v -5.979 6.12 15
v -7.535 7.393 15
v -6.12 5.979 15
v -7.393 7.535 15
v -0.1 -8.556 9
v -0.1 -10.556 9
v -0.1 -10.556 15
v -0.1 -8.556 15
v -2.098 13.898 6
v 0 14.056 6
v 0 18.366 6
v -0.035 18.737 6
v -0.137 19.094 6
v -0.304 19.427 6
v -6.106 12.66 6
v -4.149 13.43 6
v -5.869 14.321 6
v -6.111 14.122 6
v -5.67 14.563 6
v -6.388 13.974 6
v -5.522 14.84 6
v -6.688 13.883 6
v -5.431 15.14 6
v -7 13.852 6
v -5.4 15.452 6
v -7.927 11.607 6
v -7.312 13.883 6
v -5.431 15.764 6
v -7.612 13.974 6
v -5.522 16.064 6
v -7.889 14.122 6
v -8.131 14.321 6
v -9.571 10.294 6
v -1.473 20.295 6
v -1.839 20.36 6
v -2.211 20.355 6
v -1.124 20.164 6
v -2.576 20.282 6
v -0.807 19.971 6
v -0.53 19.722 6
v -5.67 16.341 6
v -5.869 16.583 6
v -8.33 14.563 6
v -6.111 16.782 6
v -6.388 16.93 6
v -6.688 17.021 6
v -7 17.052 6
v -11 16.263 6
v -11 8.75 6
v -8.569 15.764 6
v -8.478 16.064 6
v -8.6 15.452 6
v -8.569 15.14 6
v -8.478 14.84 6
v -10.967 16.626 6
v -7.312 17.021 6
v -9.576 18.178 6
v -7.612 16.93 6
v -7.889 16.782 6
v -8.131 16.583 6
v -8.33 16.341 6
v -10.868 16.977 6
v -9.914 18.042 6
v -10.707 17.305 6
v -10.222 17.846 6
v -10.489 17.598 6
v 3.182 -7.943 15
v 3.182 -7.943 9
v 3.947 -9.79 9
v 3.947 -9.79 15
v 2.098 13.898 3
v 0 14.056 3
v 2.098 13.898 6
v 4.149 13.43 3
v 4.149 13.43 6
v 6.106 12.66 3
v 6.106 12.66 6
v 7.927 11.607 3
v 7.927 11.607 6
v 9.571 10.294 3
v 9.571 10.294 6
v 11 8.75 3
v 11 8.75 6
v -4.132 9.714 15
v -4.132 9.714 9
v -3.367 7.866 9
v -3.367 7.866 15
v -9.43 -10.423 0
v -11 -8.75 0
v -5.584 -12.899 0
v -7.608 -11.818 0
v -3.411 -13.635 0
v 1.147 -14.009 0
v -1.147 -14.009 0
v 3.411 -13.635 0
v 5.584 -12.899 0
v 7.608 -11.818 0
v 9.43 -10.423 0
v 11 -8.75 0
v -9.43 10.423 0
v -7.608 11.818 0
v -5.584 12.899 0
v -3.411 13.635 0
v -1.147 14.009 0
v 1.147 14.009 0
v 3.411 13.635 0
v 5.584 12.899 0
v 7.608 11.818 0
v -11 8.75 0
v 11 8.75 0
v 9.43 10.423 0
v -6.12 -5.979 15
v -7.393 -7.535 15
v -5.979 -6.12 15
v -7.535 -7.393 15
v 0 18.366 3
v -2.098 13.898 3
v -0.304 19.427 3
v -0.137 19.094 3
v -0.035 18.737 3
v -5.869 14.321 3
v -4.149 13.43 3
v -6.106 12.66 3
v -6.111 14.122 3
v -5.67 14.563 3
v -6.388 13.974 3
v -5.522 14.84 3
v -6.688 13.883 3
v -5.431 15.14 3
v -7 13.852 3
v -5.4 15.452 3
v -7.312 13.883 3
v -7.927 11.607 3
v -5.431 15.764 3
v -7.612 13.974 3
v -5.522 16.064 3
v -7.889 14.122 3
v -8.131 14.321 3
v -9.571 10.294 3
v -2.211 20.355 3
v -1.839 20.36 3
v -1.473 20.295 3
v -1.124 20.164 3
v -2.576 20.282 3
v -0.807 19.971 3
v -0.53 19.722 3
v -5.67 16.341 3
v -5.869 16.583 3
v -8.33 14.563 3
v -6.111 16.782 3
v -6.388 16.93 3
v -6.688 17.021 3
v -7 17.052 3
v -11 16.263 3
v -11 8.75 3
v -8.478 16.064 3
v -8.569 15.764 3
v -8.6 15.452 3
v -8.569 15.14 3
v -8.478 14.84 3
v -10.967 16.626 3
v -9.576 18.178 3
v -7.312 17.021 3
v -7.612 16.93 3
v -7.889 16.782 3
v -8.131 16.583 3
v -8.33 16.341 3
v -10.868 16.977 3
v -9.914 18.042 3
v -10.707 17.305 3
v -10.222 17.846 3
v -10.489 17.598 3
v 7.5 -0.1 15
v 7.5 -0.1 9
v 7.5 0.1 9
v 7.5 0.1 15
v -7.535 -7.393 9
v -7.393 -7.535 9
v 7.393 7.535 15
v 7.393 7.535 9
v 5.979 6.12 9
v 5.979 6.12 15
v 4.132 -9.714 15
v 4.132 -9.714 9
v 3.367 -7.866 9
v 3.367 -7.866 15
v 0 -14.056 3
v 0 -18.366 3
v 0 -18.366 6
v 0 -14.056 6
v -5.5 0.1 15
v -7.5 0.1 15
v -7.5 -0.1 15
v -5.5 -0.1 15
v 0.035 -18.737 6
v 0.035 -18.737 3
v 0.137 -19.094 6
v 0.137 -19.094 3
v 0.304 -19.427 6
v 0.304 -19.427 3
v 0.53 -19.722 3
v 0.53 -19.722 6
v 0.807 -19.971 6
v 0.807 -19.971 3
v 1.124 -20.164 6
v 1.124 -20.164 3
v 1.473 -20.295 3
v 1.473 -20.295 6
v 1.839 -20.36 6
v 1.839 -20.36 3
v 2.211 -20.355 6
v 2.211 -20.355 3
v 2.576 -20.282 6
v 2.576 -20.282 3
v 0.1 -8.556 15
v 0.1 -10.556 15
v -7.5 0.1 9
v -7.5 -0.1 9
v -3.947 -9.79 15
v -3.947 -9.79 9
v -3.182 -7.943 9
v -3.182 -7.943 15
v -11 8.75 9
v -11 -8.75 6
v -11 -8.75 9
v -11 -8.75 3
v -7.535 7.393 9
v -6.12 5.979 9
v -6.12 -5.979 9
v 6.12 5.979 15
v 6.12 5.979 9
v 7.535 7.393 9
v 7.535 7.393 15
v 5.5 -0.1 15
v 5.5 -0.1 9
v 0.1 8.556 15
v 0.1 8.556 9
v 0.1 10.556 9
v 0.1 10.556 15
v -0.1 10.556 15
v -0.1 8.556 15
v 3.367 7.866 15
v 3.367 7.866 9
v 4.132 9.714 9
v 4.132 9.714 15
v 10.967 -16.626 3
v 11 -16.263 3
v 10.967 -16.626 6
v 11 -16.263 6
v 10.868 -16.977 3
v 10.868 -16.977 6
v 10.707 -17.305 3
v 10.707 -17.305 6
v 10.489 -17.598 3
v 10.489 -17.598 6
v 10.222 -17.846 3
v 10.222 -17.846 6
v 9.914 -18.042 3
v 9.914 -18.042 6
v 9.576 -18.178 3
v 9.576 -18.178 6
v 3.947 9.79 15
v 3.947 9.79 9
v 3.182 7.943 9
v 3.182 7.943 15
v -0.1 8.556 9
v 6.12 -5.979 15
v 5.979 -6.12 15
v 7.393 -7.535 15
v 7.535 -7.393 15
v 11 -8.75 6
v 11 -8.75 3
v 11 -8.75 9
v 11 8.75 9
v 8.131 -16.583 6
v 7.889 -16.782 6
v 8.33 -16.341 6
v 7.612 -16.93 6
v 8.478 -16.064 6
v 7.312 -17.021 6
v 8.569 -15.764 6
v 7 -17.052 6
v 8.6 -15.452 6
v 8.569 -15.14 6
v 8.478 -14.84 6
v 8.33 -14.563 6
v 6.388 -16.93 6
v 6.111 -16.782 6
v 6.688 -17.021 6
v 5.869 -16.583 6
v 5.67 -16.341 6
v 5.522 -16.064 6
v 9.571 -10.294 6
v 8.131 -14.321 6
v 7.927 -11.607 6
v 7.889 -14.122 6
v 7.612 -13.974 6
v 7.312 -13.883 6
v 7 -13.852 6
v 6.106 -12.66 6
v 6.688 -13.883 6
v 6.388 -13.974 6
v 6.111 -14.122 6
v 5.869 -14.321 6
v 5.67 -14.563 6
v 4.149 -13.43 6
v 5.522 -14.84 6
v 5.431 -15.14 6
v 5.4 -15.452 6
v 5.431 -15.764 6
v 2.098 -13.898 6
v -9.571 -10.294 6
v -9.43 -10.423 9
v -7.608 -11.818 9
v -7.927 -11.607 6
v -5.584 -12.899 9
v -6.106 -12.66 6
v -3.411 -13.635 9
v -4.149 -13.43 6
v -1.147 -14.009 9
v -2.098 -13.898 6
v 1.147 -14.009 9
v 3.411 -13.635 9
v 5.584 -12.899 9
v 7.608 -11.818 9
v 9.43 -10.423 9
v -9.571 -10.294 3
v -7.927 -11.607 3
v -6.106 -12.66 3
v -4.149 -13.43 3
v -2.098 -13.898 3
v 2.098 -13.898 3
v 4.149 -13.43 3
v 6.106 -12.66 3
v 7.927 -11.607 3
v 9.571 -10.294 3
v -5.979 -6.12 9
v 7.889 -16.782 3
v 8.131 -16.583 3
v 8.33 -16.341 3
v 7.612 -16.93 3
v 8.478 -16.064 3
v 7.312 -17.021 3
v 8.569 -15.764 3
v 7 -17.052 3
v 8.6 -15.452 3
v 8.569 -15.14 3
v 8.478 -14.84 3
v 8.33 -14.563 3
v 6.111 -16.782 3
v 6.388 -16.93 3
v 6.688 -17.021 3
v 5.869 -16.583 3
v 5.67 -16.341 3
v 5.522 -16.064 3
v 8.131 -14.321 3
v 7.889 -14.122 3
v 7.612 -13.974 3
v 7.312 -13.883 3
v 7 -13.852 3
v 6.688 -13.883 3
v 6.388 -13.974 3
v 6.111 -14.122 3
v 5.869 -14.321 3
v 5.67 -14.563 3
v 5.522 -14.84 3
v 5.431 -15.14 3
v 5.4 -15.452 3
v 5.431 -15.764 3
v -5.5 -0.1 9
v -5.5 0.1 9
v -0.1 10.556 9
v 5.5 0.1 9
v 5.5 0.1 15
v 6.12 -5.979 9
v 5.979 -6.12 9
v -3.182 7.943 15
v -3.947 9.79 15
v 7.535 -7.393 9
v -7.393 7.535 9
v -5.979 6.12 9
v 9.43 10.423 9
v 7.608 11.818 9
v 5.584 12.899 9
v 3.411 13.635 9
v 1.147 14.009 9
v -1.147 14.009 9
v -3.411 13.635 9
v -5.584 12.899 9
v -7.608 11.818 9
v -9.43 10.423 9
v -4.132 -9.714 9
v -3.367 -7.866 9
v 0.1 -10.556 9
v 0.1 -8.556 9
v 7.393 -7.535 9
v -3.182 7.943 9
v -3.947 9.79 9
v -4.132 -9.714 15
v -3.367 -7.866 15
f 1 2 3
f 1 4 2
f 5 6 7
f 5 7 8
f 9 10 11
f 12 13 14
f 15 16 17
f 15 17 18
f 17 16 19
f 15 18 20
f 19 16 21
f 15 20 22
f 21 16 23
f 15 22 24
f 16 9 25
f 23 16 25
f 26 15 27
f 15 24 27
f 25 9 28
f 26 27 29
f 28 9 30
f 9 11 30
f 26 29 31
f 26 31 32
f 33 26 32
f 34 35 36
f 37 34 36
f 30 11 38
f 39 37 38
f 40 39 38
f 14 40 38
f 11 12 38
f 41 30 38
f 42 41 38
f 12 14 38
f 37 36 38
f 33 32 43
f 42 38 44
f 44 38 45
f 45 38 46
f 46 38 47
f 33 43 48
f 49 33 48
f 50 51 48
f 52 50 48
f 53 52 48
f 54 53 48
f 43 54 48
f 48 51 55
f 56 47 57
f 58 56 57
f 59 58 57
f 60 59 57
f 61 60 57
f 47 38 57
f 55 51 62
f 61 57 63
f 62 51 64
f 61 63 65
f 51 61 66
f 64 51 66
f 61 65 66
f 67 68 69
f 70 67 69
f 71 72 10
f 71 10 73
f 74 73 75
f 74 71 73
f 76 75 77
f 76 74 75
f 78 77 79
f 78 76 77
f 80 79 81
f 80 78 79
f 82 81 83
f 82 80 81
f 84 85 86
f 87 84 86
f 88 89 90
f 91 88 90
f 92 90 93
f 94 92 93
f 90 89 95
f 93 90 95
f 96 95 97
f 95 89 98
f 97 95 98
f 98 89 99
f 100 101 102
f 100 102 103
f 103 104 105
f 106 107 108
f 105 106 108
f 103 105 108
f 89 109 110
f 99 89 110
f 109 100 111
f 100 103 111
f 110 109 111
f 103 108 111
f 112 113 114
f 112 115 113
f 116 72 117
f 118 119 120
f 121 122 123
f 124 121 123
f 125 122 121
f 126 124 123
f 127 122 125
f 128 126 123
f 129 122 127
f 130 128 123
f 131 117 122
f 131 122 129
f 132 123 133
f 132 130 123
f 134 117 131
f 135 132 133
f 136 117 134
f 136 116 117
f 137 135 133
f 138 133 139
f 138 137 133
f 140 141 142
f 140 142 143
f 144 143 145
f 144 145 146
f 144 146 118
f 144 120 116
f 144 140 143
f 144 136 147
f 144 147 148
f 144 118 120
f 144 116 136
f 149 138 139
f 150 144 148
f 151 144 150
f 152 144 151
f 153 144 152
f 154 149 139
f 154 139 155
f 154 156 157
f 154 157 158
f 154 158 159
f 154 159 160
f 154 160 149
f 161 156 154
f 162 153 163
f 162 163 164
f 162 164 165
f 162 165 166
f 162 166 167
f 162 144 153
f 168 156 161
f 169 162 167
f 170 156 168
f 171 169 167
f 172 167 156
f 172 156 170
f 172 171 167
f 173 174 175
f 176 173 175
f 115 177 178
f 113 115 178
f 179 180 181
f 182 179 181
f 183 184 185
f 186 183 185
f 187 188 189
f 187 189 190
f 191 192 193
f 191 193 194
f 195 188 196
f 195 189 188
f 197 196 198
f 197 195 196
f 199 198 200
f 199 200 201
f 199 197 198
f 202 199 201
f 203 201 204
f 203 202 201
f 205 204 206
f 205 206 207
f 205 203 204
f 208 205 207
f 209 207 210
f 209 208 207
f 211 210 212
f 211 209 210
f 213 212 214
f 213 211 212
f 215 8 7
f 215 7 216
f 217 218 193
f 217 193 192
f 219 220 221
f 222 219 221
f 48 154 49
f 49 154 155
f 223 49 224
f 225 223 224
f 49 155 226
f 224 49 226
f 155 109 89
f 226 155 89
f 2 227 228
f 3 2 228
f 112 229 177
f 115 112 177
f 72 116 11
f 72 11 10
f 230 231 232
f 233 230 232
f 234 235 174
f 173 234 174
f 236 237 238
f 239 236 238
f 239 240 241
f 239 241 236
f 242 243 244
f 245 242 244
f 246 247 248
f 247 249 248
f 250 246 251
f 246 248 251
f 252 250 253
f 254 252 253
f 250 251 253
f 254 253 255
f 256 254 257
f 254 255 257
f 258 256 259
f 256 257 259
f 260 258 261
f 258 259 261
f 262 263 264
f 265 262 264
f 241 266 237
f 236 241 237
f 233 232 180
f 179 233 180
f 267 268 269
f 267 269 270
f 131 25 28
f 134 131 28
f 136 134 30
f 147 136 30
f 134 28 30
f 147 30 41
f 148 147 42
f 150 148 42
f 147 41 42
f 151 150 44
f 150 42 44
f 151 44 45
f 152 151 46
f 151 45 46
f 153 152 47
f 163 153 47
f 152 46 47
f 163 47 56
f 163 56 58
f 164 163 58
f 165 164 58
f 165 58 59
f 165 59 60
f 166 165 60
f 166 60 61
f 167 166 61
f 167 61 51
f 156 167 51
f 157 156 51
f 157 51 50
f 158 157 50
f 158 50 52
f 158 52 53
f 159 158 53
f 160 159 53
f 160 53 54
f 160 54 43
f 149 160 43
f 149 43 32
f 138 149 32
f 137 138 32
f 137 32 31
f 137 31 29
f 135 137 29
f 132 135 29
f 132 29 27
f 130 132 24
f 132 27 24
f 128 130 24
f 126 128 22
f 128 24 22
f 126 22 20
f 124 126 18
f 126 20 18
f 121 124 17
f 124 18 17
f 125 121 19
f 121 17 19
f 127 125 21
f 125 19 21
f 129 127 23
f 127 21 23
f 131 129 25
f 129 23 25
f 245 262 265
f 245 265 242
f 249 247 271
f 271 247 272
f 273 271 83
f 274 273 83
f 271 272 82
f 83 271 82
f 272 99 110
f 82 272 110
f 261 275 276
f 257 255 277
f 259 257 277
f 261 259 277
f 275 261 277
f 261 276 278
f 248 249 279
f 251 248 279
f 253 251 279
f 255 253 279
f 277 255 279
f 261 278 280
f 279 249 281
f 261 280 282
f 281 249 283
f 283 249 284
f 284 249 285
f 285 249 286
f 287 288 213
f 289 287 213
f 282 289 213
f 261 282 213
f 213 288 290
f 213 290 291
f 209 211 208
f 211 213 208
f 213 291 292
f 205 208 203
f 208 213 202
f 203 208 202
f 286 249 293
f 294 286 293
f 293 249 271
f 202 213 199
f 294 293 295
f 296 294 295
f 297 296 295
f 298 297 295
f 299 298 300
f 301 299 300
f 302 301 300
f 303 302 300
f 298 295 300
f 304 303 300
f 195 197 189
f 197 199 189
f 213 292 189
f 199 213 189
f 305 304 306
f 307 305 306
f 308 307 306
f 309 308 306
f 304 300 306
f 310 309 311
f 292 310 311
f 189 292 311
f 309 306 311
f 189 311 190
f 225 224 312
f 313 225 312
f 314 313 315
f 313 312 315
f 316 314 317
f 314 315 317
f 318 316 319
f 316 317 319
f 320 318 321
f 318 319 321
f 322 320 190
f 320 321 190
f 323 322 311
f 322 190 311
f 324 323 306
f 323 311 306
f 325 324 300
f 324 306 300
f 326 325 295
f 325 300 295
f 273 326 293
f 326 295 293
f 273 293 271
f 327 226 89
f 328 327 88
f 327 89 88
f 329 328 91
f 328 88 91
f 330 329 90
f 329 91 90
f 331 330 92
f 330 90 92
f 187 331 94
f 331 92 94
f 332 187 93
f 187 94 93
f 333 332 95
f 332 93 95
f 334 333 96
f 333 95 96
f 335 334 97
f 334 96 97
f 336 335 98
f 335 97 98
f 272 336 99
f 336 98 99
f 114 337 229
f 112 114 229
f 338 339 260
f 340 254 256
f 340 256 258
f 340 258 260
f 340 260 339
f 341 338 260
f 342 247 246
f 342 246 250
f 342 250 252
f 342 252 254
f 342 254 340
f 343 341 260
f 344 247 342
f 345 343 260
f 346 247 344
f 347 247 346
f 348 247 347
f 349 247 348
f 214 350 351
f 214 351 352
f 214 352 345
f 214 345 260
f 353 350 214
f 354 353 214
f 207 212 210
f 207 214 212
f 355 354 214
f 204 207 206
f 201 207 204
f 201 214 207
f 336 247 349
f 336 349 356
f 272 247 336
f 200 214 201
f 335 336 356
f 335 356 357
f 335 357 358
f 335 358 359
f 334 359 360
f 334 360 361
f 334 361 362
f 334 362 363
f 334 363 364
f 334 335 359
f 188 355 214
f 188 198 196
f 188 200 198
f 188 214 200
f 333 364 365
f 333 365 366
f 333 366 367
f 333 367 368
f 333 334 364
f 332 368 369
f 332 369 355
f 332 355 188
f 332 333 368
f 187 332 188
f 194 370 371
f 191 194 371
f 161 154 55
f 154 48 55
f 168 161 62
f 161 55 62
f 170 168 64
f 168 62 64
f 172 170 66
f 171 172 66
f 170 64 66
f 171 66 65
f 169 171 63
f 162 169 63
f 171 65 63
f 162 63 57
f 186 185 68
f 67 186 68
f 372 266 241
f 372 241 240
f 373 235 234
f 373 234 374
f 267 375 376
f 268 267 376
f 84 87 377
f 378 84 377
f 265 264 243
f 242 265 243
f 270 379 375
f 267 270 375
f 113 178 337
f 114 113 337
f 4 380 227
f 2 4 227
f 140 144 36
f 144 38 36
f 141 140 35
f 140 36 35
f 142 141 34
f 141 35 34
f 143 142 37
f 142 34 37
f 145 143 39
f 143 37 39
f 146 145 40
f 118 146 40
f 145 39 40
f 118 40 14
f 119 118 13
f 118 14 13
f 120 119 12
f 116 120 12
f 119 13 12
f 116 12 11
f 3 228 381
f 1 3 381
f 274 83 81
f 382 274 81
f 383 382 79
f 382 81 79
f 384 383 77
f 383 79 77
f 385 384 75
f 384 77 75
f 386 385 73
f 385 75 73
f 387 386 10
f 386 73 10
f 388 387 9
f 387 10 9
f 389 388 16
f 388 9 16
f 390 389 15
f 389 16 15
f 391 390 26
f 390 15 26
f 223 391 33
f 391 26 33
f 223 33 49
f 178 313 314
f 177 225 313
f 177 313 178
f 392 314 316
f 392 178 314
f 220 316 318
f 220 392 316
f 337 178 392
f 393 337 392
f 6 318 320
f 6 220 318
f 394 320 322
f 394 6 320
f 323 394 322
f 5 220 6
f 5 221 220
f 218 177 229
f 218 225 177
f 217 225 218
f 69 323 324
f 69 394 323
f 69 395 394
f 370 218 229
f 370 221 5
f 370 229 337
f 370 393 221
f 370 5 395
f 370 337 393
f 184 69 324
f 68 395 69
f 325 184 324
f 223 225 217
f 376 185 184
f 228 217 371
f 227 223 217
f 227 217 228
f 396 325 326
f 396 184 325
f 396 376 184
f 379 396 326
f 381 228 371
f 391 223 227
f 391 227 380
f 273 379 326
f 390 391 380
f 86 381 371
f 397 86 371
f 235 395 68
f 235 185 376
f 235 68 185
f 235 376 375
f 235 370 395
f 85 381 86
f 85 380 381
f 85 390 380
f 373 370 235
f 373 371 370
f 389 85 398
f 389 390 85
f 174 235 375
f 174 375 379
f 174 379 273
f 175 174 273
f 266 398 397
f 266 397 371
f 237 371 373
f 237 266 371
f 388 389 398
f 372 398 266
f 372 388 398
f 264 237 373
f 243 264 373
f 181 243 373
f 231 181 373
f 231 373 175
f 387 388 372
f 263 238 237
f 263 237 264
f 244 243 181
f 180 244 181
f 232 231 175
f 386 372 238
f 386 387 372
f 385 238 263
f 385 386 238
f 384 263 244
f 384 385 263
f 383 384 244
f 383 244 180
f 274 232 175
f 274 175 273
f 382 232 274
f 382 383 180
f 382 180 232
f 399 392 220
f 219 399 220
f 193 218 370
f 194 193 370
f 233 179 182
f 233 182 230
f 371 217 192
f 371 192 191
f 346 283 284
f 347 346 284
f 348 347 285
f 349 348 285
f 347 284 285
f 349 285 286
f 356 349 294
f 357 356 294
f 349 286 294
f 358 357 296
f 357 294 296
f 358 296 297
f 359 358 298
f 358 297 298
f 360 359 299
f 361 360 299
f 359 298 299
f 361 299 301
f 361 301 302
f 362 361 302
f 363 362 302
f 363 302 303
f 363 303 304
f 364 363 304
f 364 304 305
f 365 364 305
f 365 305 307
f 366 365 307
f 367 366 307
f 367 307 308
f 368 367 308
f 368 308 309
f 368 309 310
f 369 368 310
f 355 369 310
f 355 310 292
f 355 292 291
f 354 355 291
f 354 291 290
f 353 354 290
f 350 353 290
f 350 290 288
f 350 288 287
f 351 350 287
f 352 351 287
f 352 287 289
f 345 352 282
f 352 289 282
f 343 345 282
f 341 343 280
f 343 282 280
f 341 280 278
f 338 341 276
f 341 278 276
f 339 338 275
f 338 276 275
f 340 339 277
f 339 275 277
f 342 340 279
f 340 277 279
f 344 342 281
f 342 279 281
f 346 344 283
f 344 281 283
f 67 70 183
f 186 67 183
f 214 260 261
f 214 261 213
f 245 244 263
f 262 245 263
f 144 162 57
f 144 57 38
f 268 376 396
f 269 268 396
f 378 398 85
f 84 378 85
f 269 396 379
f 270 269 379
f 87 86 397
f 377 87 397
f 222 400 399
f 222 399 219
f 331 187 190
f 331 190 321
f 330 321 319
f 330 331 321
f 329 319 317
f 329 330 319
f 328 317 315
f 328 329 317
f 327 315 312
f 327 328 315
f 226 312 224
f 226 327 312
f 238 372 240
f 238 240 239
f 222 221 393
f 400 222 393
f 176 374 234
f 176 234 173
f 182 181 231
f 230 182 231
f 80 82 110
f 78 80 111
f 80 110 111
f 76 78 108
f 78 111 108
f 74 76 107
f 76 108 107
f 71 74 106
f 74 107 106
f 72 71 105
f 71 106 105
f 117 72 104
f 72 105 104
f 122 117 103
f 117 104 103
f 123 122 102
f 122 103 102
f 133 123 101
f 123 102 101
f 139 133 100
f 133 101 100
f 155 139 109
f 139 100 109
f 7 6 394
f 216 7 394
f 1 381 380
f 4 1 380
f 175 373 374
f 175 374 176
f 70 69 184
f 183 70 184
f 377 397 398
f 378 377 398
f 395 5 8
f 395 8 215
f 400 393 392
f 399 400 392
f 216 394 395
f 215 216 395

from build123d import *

# Parameters (mm, degrees)
EXTRUDE_1_DEPTH     = 3
EXTRUDE_2_DEPTH     = 3
EXTRUDE_3_DEPTH     = 3
SKETCH_4_R          = 1.6
CUT_EXTRUDE_1_DEPTH = 25.501881543
FILLET_1_R          = 2
SKETCH_5_W          = 0.2
SKETCH_5_H          = 2
SKETCH_5_W_2        = 2
SKETCH_5_H_2        = 0.2
EXTRUDE_4_DEPTH     = 6


with BuildPart() as part:
    # ｽｹｯﾁ1 → ﾎﾞｽ - 押し出し1 (new body)
    with BuildSketch(Plane.XY):
        with BuildLine():
            Line((-11, 8.75), (-11, -8.75))
            ThreePointArc((-11, -8.75), (0, -14.055692797), (11, -8.75))
            Line((11, -8.75), (11, 8.75))
            ThreePointArc((11, 8.75), (0, 14.055692797), (-11, 8.75))
        make_face()
    extrude(amount=EXTRUDE_1_DEPTH)

    # ｽｹｯﾁ2 → ﾎﾞｽ - 押し出し2 (add)
    with BuildSketch(Plane.XY.offset(3)):
        with BuildLine():
            Line((-11, 8.75), (-11, 17.75))
            Line((-11, 17.75), (0, 21.055692797))
            Line((0, 21.055692797), (0, 14.055692797))
            ThreePointArc((0, 14.055692797), (6.106356853, 12.65997259), (11, 8.75))
            Line((11, 8.75), (11, -8.75))
            Line((11, -8.75), (11, -17.75))
            Line((11, -17.75), (0, -21.055692797))
            Line((0, -21.055692797), (0, -14.055692797))
            ThreePointArc((0, -14.055692797), (-6.106356853, -12.65997259), (-11, -8.75))
            Line((-11, -8.75), (-11, 8.75))
        make_face()
    extrude(amount=EXTRUDE_2_DEPTH)

    # ｽｹｯﾁ3 → ﾎﾞｽ - 押し出し3 (add)
    with BuildSketch(Plane.XY.offset(6)):
        with BuildLine():
            Line((-11, 8.75), (-11, -8.75))
            ThreePointArc((-11, -8.75), (0, -14.055692797), (11, -8.75))
            Line((11, -8.75), (11, 8.75))
            ThreePointArc((11, 8.75), (0, 14.055692797), (-11, 8.75))
        make_face()
    extrude(amount=EXTRUDE_3_DEPTH)

    # ｽｹｯﾁ4 → ｶｯﾄ - 押し出し1 (cut, through all)
    with BuildSketch(Plane.XY.offset(6)):
        with Locations((-7, 15.452070108)):
            Circle(SKETCH_4_R)
        with Locations((7, -15.452070108)):
            Circle(SKETCH_4_R)
    extrude(amount=-CUT_EXTRUDE_1_DEPTH, mode=Mode.SUBTRACT)

    # ﾌｨﾚｯﾄ1
    fillet_1_edges = [part.edges().sort_by_distance(p)[0] for p in [
        (0, -21.055692797, 4.5),
        (11, -17.75, 4.5),
        (0, 21.055692797, 4.5),
        (-11, 17.75, 4.5),
    ]]
    fillet(fillet_1_edges, radius=FILLET_1_R)

    # ｽｹｯﾁ5 → ﾎﾞｽ - 押し出し4 (add)
    with BuildSketch(Plane.XY.offset(9)):
        Polygon((3.947100797, 9.79045687), (3.181733933, 7.942697805), (3.366509839, 7.866161118), (4.131876704, 9.713920183), align=None)
        with Locations((0, 9.555692797)):
            Rectangle(SKETCH_5_W, SKETCH_5_H)
        Polygon((7.393291279, 7.534712635), (5.979077716, 6.120499073), (6.120499073, 5.979077716), (7.534712635, 7.393291279), align=None)
        Polygon((7.534712635, -7.393291279), (6.120499073, -5.979077716), (5.979077716, -6.120499073), (7.393291279, -7.534712635), align=None)
        Polygon((4.131876704, -9.713920183), (3.366509839, -7.866161118), (3.181733933, -7.942697805), (3.947100797, -9.79045687), align=None)
        with Locations((0, -9.555692797)):
            Rectangle(SKETCH_5_W, SKETCH_5_H)
        Polygon((-3.947100797, -9.79045687), (-3.181733933, -7.942697805), (-3.366509839, -7.866161118), (-4.131876704, -9.713920183), align=None)
        Polygon((-7.393291279, -7.534712635), (-5.979077716, -6.120499073), (-6.120499073, -5.979077716), (-7.534712635, -7.393291279), align=None)
        Polygon((-7.534712635, 7.393291279), (-6.120499073, 5.979077716), (-5.979077716, 6.120499073), (-7.393291279, 7.534712635), align=None)
        Polygon((-4.131876704, 9.713920183), (-3.366509839, 7.866161118), (-3.181733933, 7.942697805), (-3.947100797, 9.79045687), align=None)
        with Locations((-6.5, 0)):
            Rectangle(SKETCH_5_W_2, SKETCH_5_H_2)
        with Locations((6.5, 0)):
            Rectangle(SKETCH_5_W_2, SKETCH_5_H_2)
    extrude(amount=EXTRUDE_4_DEPTH)


solid = part.part
